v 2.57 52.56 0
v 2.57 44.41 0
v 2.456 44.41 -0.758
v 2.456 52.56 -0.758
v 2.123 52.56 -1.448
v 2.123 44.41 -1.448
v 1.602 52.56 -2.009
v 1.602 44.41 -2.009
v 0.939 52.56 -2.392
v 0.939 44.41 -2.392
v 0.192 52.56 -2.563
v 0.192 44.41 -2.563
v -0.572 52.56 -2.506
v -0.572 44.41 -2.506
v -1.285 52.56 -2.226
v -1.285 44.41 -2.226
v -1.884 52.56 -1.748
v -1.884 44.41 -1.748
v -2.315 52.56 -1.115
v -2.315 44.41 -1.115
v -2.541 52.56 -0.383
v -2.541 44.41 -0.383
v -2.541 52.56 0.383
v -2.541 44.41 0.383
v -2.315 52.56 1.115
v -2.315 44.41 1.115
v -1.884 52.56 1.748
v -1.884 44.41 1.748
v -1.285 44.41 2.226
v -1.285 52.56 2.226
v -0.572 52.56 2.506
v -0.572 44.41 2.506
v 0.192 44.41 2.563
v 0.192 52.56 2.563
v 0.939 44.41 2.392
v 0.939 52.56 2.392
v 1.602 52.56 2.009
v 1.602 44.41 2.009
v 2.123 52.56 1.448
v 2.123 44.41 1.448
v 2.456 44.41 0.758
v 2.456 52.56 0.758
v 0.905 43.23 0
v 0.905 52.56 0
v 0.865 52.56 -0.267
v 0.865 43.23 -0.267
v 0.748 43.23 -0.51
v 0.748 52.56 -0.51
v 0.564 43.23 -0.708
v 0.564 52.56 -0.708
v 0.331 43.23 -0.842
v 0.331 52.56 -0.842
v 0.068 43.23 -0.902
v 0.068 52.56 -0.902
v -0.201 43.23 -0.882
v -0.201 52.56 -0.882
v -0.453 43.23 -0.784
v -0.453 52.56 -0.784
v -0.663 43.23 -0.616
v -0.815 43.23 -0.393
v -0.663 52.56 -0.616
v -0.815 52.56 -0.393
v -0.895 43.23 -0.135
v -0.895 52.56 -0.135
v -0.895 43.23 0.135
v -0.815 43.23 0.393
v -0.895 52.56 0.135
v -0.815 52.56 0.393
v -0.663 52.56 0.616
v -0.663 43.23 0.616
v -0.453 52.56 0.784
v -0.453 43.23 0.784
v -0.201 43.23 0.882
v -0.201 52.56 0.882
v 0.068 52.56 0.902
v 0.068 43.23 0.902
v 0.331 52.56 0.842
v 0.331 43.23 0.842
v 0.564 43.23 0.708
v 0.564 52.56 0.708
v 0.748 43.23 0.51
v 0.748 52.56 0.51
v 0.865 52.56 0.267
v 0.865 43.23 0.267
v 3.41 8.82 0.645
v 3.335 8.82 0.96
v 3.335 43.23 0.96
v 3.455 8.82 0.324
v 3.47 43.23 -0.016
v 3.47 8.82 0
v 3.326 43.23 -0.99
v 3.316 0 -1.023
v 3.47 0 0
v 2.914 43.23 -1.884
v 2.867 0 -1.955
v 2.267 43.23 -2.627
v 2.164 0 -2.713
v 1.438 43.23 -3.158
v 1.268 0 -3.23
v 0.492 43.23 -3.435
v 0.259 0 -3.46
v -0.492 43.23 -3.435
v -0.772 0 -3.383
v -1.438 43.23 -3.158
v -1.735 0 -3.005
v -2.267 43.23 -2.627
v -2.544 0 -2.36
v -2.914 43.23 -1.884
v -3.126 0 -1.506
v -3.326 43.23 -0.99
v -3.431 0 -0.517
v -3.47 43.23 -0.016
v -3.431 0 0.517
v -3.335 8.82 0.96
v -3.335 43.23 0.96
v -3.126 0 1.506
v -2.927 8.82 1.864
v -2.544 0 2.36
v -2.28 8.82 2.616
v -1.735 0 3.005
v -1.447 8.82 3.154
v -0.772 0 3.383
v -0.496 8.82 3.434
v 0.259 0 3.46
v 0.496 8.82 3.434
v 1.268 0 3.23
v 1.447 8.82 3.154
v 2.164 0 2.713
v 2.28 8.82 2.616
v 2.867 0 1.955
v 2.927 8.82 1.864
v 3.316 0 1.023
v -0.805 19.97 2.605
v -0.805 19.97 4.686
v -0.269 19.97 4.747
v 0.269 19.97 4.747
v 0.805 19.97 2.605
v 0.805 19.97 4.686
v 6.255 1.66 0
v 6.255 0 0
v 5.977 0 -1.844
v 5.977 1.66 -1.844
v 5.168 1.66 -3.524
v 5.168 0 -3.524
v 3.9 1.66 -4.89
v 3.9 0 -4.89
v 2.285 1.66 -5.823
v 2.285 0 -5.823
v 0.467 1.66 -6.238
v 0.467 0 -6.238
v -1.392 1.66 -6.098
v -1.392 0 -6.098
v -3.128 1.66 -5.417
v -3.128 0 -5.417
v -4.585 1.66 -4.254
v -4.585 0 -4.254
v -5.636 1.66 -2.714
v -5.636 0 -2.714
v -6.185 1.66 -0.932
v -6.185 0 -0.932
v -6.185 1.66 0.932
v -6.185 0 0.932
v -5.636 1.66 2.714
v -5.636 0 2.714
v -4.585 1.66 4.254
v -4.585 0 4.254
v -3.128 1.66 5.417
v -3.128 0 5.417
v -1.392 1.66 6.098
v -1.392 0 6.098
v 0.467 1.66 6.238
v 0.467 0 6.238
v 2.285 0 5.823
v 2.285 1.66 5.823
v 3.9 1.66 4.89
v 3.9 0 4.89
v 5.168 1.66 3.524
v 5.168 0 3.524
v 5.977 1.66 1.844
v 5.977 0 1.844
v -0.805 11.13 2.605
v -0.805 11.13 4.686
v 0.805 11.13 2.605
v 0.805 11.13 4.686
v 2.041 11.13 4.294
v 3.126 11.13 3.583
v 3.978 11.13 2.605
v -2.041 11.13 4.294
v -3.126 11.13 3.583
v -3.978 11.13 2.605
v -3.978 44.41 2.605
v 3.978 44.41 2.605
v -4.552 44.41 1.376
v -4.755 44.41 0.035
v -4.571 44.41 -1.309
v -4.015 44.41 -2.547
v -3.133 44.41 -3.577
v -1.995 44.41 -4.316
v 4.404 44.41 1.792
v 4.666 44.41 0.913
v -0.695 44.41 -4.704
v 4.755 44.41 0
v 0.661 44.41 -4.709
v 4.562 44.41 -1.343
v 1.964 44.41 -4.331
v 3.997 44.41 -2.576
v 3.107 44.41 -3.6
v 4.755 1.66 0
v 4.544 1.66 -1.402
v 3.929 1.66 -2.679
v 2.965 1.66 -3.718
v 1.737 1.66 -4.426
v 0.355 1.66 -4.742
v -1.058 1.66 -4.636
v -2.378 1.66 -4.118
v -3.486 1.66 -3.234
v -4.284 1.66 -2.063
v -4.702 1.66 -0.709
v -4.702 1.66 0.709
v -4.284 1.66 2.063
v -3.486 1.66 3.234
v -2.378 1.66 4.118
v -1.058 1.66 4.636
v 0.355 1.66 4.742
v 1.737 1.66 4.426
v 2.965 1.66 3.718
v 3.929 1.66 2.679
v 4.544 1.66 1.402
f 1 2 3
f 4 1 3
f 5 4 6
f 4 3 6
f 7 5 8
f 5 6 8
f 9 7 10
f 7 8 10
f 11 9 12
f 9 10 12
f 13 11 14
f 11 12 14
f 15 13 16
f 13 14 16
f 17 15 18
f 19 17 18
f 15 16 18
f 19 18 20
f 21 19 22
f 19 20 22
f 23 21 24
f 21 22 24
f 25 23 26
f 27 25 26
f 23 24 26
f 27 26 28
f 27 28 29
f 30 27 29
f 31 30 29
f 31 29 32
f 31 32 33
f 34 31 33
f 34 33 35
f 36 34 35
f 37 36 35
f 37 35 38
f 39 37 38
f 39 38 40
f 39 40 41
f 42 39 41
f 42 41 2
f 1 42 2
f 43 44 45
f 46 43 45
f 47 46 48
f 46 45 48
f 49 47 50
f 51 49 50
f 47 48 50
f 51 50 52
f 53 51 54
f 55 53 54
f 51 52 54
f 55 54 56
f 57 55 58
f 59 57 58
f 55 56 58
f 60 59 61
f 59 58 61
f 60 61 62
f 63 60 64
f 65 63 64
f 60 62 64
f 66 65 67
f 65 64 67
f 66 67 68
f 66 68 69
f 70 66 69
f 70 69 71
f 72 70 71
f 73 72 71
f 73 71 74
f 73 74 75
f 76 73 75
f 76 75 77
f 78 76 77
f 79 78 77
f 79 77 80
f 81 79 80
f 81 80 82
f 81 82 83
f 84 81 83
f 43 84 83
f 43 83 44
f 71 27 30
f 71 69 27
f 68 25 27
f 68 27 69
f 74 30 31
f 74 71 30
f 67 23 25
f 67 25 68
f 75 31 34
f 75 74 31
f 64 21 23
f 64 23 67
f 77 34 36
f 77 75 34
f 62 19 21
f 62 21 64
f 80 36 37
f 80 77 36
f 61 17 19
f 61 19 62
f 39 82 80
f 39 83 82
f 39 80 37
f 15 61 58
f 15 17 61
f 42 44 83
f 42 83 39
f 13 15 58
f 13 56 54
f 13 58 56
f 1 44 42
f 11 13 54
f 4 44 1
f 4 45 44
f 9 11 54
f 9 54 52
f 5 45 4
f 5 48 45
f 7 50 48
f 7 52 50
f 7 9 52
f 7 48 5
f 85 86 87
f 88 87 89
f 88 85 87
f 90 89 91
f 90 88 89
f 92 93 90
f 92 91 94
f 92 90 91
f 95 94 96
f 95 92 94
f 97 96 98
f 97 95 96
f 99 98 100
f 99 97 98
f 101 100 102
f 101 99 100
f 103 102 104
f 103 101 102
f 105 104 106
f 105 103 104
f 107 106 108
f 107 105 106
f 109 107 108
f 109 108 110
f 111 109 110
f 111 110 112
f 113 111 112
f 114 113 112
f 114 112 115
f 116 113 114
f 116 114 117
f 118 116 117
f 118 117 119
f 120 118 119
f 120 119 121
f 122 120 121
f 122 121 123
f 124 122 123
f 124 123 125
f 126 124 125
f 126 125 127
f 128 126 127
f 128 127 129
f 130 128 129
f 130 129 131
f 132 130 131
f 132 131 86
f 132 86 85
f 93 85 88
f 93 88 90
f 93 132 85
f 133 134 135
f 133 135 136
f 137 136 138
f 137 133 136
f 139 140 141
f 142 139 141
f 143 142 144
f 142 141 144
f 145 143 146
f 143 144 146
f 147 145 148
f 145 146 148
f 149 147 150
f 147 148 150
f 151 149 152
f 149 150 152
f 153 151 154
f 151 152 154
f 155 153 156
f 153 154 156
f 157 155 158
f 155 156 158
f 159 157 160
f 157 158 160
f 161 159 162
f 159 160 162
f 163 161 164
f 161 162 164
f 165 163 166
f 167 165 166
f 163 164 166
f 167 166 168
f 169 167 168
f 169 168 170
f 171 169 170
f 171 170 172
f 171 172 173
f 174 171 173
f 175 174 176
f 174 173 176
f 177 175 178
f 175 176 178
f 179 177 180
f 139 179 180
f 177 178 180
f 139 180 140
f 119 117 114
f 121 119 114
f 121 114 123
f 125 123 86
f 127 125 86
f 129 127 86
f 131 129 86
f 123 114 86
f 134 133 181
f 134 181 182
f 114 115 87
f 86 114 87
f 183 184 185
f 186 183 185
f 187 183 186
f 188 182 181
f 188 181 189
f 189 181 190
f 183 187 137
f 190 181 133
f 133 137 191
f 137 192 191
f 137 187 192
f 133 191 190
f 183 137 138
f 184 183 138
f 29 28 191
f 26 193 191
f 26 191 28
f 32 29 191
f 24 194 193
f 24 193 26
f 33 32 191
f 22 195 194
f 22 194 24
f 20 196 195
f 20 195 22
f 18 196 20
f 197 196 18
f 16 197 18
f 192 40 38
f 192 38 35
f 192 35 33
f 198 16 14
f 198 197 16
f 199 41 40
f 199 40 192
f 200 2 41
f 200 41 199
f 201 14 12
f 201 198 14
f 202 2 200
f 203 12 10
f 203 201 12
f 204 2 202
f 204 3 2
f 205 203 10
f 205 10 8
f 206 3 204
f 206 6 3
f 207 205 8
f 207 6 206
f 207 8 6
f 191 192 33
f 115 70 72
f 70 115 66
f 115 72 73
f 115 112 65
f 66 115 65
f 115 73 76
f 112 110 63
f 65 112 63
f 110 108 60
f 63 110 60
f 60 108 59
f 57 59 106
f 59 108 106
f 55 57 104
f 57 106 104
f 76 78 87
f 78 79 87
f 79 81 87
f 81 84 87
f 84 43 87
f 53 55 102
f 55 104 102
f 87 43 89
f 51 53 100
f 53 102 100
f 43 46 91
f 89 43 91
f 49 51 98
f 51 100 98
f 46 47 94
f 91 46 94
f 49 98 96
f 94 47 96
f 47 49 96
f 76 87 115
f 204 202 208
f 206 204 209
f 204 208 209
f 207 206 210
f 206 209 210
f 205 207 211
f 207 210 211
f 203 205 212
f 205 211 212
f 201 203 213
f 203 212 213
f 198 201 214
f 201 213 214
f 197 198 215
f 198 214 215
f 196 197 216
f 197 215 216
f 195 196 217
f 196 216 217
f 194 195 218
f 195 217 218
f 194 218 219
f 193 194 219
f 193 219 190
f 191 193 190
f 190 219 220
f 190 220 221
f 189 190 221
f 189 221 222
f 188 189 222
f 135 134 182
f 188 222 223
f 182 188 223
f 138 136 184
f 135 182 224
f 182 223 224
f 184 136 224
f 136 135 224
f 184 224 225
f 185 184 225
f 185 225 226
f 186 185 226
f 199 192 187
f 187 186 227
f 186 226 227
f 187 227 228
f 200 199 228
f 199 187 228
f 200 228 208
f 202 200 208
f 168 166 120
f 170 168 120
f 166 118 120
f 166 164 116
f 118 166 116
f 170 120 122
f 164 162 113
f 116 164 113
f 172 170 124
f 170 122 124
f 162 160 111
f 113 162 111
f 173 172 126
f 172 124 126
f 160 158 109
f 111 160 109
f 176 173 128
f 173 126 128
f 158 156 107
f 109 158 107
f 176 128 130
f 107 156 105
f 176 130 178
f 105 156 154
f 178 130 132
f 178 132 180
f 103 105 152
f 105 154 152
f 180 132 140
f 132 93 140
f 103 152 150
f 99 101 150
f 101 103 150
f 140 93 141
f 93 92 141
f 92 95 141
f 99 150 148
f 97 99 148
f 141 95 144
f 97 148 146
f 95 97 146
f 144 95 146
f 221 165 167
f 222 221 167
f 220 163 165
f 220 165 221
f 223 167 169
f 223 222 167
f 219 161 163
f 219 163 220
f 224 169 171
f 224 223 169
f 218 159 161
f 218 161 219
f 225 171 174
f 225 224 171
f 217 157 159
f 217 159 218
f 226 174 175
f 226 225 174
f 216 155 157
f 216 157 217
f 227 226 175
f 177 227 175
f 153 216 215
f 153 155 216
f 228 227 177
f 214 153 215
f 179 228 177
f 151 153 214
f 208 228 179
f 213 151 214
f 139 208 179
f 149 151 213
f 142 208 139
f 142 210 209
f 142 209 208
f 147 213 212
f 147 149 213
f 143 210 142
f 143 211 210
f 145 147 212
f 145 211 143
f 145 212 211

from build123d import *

# Parameters (mm, degrees)
SKETCH1_R             = 6.255
BOTTOM_RING_DEPTH     = 1.66
SKETCH2_R             = 4.755
MAIN_CYLINDER_DEPTH   = 44.41
SKETCH3_R             = 2.57
TOP_CYLINDER_DEPTH    = 52.56
CUTOUT_PT1_DEPTH      = 33.28
CUTOUT_PT2_DEPTH      = 24.44
SKETCH6_R             = 3.47
BOTTOM_HOLE_PT1_DEPTH = 8.82
SKETCH7_R             = 0.905
TOP_HOLE_DEPTH        = 53.56
BOTTOM_HOLE_PT2_DEPTH = 43.23


with BuildPart() as part:
    # Sketch1 → Bottom Ring (new body)
    with BuildSketch(Plane(origin=(0, 0, 0), x_dir=(1, 0, 0), z_dir=(0, 1, 0))):
        Circle(SKETCH1_R)
    extrude(amount=BOTTOM_RING_DEPTH)

    # Sketch2 → Main Cylinder (add)
    with BuildSketch(Plane(origin=(0, 0, 0), x_dir=(1, 0, 0), z_dir=(0, 1, 0))):
        Circle(SKETCH2_R)
    extrude(amount=MAIN_CYLINDER_DEPTH)

    # Sketch3 → Top Cylinder (add)
    with BuildSketch(Plane(origin=(0, 0, 0), x_dir=(1, 0, 0), z_dir=(0, 1, 0))):
        Circle(SKETCH3_R)
    extrude(amount=TOP_CYLINDER_DEPTH)

    # Sketch4 → Cutout pt1 (cut)
    with BuildSketch(Plane(origin=(0, 44.41, 0), x_dir=(1, 0, 0), z_dir=(0, 1, 0))):
        with BuildLine():
            Line((-0.805, -2.605), (-0.805, -4.686363195))
            ThreePointArc((-0.805, -4.686363195), (-2.608092205, -3.97591248), (-3.977939165, -2.605))
            Line((-3.977939165, -2.605), (-0.805, -2.605))
        make_face()
        with BuildLine():
            Line((0.805, -2.605), (0.805, -4.686363195))
            ThreePointArc((0.805, -4.686363195), (2.608092205, -3.97591248), (3.977939165, -2.605))
            Line((3.977939165, -2.605), (0.805, -2.605))
        make_face()
    extrude(amount=-CUTOUT_PT1_DEPTH, mode=Mode.SUBTRACT)

    # Sketch5 → Cutout pt2 (cut)
    with BuildSketch(Plane(origin=(0, 44.41, 0), x_dir=(1, 0, 0), z_dir=(0, 1, 0))):
        with BuildLine():
            Line((-0.805, -2.605), (-0.805, -4.686363195))
            ThreePointArc((-0.805, -4.686363195), (0, -4.755), (0.805, -4.686363195))
            Line((0.805, -4.686363195), (0.805, -2.605))
            Line((0.805, -2.605), (-0.805, -2.605))
        make_face()
    extrude(amount=-CUTOUT_PT2_DEPTH, mode=Mode.SUBTRACT)

    # Sketch6 → Bottom Hole pt1 (cut)
    with BuildSketch(Plane(origin=(0, 0, 0), x_dir=(1, 0, 0), z_dir=(0, 1, 0))):
        Circle(SKETCH6_R)
    extrude(amount=BOTTOM_HOLE_PT1_DEPTH, mode=Mode.SUBTRACT)

    # Sketch7 → Top Hole (cut, through all)
    with BuildSketch(Plane(origin=(0, 52.56, 0), x_dir=(1, 0, 0), z_dir=(0, 1, 0))):
        Circle(SKETCH7_R)
    extrude(amount=-TOP_HOLE_DEPTH, mode=Mode.SUBTRACT)

    # Sketch8 → Bottom Hole pt2 (cut)
    with BuildSketch(Plane(origin=(0, 0, 0), x_dir=(1, 0, 0), z_dir=(0, 1, 0))):
        with BuildLine():
            Line((-3.33456144, -0.96), (3.33456144, -0.96))
            ThreePointArc((3.33456144, -0.96), (0, 3.47), (-3.33456144, -0.96))
        make_face()
    extrude(amount=BOTTOM_HOLE_PT2_DEPTH, mode=Mode.SUBTRACT)


solid = part.part
